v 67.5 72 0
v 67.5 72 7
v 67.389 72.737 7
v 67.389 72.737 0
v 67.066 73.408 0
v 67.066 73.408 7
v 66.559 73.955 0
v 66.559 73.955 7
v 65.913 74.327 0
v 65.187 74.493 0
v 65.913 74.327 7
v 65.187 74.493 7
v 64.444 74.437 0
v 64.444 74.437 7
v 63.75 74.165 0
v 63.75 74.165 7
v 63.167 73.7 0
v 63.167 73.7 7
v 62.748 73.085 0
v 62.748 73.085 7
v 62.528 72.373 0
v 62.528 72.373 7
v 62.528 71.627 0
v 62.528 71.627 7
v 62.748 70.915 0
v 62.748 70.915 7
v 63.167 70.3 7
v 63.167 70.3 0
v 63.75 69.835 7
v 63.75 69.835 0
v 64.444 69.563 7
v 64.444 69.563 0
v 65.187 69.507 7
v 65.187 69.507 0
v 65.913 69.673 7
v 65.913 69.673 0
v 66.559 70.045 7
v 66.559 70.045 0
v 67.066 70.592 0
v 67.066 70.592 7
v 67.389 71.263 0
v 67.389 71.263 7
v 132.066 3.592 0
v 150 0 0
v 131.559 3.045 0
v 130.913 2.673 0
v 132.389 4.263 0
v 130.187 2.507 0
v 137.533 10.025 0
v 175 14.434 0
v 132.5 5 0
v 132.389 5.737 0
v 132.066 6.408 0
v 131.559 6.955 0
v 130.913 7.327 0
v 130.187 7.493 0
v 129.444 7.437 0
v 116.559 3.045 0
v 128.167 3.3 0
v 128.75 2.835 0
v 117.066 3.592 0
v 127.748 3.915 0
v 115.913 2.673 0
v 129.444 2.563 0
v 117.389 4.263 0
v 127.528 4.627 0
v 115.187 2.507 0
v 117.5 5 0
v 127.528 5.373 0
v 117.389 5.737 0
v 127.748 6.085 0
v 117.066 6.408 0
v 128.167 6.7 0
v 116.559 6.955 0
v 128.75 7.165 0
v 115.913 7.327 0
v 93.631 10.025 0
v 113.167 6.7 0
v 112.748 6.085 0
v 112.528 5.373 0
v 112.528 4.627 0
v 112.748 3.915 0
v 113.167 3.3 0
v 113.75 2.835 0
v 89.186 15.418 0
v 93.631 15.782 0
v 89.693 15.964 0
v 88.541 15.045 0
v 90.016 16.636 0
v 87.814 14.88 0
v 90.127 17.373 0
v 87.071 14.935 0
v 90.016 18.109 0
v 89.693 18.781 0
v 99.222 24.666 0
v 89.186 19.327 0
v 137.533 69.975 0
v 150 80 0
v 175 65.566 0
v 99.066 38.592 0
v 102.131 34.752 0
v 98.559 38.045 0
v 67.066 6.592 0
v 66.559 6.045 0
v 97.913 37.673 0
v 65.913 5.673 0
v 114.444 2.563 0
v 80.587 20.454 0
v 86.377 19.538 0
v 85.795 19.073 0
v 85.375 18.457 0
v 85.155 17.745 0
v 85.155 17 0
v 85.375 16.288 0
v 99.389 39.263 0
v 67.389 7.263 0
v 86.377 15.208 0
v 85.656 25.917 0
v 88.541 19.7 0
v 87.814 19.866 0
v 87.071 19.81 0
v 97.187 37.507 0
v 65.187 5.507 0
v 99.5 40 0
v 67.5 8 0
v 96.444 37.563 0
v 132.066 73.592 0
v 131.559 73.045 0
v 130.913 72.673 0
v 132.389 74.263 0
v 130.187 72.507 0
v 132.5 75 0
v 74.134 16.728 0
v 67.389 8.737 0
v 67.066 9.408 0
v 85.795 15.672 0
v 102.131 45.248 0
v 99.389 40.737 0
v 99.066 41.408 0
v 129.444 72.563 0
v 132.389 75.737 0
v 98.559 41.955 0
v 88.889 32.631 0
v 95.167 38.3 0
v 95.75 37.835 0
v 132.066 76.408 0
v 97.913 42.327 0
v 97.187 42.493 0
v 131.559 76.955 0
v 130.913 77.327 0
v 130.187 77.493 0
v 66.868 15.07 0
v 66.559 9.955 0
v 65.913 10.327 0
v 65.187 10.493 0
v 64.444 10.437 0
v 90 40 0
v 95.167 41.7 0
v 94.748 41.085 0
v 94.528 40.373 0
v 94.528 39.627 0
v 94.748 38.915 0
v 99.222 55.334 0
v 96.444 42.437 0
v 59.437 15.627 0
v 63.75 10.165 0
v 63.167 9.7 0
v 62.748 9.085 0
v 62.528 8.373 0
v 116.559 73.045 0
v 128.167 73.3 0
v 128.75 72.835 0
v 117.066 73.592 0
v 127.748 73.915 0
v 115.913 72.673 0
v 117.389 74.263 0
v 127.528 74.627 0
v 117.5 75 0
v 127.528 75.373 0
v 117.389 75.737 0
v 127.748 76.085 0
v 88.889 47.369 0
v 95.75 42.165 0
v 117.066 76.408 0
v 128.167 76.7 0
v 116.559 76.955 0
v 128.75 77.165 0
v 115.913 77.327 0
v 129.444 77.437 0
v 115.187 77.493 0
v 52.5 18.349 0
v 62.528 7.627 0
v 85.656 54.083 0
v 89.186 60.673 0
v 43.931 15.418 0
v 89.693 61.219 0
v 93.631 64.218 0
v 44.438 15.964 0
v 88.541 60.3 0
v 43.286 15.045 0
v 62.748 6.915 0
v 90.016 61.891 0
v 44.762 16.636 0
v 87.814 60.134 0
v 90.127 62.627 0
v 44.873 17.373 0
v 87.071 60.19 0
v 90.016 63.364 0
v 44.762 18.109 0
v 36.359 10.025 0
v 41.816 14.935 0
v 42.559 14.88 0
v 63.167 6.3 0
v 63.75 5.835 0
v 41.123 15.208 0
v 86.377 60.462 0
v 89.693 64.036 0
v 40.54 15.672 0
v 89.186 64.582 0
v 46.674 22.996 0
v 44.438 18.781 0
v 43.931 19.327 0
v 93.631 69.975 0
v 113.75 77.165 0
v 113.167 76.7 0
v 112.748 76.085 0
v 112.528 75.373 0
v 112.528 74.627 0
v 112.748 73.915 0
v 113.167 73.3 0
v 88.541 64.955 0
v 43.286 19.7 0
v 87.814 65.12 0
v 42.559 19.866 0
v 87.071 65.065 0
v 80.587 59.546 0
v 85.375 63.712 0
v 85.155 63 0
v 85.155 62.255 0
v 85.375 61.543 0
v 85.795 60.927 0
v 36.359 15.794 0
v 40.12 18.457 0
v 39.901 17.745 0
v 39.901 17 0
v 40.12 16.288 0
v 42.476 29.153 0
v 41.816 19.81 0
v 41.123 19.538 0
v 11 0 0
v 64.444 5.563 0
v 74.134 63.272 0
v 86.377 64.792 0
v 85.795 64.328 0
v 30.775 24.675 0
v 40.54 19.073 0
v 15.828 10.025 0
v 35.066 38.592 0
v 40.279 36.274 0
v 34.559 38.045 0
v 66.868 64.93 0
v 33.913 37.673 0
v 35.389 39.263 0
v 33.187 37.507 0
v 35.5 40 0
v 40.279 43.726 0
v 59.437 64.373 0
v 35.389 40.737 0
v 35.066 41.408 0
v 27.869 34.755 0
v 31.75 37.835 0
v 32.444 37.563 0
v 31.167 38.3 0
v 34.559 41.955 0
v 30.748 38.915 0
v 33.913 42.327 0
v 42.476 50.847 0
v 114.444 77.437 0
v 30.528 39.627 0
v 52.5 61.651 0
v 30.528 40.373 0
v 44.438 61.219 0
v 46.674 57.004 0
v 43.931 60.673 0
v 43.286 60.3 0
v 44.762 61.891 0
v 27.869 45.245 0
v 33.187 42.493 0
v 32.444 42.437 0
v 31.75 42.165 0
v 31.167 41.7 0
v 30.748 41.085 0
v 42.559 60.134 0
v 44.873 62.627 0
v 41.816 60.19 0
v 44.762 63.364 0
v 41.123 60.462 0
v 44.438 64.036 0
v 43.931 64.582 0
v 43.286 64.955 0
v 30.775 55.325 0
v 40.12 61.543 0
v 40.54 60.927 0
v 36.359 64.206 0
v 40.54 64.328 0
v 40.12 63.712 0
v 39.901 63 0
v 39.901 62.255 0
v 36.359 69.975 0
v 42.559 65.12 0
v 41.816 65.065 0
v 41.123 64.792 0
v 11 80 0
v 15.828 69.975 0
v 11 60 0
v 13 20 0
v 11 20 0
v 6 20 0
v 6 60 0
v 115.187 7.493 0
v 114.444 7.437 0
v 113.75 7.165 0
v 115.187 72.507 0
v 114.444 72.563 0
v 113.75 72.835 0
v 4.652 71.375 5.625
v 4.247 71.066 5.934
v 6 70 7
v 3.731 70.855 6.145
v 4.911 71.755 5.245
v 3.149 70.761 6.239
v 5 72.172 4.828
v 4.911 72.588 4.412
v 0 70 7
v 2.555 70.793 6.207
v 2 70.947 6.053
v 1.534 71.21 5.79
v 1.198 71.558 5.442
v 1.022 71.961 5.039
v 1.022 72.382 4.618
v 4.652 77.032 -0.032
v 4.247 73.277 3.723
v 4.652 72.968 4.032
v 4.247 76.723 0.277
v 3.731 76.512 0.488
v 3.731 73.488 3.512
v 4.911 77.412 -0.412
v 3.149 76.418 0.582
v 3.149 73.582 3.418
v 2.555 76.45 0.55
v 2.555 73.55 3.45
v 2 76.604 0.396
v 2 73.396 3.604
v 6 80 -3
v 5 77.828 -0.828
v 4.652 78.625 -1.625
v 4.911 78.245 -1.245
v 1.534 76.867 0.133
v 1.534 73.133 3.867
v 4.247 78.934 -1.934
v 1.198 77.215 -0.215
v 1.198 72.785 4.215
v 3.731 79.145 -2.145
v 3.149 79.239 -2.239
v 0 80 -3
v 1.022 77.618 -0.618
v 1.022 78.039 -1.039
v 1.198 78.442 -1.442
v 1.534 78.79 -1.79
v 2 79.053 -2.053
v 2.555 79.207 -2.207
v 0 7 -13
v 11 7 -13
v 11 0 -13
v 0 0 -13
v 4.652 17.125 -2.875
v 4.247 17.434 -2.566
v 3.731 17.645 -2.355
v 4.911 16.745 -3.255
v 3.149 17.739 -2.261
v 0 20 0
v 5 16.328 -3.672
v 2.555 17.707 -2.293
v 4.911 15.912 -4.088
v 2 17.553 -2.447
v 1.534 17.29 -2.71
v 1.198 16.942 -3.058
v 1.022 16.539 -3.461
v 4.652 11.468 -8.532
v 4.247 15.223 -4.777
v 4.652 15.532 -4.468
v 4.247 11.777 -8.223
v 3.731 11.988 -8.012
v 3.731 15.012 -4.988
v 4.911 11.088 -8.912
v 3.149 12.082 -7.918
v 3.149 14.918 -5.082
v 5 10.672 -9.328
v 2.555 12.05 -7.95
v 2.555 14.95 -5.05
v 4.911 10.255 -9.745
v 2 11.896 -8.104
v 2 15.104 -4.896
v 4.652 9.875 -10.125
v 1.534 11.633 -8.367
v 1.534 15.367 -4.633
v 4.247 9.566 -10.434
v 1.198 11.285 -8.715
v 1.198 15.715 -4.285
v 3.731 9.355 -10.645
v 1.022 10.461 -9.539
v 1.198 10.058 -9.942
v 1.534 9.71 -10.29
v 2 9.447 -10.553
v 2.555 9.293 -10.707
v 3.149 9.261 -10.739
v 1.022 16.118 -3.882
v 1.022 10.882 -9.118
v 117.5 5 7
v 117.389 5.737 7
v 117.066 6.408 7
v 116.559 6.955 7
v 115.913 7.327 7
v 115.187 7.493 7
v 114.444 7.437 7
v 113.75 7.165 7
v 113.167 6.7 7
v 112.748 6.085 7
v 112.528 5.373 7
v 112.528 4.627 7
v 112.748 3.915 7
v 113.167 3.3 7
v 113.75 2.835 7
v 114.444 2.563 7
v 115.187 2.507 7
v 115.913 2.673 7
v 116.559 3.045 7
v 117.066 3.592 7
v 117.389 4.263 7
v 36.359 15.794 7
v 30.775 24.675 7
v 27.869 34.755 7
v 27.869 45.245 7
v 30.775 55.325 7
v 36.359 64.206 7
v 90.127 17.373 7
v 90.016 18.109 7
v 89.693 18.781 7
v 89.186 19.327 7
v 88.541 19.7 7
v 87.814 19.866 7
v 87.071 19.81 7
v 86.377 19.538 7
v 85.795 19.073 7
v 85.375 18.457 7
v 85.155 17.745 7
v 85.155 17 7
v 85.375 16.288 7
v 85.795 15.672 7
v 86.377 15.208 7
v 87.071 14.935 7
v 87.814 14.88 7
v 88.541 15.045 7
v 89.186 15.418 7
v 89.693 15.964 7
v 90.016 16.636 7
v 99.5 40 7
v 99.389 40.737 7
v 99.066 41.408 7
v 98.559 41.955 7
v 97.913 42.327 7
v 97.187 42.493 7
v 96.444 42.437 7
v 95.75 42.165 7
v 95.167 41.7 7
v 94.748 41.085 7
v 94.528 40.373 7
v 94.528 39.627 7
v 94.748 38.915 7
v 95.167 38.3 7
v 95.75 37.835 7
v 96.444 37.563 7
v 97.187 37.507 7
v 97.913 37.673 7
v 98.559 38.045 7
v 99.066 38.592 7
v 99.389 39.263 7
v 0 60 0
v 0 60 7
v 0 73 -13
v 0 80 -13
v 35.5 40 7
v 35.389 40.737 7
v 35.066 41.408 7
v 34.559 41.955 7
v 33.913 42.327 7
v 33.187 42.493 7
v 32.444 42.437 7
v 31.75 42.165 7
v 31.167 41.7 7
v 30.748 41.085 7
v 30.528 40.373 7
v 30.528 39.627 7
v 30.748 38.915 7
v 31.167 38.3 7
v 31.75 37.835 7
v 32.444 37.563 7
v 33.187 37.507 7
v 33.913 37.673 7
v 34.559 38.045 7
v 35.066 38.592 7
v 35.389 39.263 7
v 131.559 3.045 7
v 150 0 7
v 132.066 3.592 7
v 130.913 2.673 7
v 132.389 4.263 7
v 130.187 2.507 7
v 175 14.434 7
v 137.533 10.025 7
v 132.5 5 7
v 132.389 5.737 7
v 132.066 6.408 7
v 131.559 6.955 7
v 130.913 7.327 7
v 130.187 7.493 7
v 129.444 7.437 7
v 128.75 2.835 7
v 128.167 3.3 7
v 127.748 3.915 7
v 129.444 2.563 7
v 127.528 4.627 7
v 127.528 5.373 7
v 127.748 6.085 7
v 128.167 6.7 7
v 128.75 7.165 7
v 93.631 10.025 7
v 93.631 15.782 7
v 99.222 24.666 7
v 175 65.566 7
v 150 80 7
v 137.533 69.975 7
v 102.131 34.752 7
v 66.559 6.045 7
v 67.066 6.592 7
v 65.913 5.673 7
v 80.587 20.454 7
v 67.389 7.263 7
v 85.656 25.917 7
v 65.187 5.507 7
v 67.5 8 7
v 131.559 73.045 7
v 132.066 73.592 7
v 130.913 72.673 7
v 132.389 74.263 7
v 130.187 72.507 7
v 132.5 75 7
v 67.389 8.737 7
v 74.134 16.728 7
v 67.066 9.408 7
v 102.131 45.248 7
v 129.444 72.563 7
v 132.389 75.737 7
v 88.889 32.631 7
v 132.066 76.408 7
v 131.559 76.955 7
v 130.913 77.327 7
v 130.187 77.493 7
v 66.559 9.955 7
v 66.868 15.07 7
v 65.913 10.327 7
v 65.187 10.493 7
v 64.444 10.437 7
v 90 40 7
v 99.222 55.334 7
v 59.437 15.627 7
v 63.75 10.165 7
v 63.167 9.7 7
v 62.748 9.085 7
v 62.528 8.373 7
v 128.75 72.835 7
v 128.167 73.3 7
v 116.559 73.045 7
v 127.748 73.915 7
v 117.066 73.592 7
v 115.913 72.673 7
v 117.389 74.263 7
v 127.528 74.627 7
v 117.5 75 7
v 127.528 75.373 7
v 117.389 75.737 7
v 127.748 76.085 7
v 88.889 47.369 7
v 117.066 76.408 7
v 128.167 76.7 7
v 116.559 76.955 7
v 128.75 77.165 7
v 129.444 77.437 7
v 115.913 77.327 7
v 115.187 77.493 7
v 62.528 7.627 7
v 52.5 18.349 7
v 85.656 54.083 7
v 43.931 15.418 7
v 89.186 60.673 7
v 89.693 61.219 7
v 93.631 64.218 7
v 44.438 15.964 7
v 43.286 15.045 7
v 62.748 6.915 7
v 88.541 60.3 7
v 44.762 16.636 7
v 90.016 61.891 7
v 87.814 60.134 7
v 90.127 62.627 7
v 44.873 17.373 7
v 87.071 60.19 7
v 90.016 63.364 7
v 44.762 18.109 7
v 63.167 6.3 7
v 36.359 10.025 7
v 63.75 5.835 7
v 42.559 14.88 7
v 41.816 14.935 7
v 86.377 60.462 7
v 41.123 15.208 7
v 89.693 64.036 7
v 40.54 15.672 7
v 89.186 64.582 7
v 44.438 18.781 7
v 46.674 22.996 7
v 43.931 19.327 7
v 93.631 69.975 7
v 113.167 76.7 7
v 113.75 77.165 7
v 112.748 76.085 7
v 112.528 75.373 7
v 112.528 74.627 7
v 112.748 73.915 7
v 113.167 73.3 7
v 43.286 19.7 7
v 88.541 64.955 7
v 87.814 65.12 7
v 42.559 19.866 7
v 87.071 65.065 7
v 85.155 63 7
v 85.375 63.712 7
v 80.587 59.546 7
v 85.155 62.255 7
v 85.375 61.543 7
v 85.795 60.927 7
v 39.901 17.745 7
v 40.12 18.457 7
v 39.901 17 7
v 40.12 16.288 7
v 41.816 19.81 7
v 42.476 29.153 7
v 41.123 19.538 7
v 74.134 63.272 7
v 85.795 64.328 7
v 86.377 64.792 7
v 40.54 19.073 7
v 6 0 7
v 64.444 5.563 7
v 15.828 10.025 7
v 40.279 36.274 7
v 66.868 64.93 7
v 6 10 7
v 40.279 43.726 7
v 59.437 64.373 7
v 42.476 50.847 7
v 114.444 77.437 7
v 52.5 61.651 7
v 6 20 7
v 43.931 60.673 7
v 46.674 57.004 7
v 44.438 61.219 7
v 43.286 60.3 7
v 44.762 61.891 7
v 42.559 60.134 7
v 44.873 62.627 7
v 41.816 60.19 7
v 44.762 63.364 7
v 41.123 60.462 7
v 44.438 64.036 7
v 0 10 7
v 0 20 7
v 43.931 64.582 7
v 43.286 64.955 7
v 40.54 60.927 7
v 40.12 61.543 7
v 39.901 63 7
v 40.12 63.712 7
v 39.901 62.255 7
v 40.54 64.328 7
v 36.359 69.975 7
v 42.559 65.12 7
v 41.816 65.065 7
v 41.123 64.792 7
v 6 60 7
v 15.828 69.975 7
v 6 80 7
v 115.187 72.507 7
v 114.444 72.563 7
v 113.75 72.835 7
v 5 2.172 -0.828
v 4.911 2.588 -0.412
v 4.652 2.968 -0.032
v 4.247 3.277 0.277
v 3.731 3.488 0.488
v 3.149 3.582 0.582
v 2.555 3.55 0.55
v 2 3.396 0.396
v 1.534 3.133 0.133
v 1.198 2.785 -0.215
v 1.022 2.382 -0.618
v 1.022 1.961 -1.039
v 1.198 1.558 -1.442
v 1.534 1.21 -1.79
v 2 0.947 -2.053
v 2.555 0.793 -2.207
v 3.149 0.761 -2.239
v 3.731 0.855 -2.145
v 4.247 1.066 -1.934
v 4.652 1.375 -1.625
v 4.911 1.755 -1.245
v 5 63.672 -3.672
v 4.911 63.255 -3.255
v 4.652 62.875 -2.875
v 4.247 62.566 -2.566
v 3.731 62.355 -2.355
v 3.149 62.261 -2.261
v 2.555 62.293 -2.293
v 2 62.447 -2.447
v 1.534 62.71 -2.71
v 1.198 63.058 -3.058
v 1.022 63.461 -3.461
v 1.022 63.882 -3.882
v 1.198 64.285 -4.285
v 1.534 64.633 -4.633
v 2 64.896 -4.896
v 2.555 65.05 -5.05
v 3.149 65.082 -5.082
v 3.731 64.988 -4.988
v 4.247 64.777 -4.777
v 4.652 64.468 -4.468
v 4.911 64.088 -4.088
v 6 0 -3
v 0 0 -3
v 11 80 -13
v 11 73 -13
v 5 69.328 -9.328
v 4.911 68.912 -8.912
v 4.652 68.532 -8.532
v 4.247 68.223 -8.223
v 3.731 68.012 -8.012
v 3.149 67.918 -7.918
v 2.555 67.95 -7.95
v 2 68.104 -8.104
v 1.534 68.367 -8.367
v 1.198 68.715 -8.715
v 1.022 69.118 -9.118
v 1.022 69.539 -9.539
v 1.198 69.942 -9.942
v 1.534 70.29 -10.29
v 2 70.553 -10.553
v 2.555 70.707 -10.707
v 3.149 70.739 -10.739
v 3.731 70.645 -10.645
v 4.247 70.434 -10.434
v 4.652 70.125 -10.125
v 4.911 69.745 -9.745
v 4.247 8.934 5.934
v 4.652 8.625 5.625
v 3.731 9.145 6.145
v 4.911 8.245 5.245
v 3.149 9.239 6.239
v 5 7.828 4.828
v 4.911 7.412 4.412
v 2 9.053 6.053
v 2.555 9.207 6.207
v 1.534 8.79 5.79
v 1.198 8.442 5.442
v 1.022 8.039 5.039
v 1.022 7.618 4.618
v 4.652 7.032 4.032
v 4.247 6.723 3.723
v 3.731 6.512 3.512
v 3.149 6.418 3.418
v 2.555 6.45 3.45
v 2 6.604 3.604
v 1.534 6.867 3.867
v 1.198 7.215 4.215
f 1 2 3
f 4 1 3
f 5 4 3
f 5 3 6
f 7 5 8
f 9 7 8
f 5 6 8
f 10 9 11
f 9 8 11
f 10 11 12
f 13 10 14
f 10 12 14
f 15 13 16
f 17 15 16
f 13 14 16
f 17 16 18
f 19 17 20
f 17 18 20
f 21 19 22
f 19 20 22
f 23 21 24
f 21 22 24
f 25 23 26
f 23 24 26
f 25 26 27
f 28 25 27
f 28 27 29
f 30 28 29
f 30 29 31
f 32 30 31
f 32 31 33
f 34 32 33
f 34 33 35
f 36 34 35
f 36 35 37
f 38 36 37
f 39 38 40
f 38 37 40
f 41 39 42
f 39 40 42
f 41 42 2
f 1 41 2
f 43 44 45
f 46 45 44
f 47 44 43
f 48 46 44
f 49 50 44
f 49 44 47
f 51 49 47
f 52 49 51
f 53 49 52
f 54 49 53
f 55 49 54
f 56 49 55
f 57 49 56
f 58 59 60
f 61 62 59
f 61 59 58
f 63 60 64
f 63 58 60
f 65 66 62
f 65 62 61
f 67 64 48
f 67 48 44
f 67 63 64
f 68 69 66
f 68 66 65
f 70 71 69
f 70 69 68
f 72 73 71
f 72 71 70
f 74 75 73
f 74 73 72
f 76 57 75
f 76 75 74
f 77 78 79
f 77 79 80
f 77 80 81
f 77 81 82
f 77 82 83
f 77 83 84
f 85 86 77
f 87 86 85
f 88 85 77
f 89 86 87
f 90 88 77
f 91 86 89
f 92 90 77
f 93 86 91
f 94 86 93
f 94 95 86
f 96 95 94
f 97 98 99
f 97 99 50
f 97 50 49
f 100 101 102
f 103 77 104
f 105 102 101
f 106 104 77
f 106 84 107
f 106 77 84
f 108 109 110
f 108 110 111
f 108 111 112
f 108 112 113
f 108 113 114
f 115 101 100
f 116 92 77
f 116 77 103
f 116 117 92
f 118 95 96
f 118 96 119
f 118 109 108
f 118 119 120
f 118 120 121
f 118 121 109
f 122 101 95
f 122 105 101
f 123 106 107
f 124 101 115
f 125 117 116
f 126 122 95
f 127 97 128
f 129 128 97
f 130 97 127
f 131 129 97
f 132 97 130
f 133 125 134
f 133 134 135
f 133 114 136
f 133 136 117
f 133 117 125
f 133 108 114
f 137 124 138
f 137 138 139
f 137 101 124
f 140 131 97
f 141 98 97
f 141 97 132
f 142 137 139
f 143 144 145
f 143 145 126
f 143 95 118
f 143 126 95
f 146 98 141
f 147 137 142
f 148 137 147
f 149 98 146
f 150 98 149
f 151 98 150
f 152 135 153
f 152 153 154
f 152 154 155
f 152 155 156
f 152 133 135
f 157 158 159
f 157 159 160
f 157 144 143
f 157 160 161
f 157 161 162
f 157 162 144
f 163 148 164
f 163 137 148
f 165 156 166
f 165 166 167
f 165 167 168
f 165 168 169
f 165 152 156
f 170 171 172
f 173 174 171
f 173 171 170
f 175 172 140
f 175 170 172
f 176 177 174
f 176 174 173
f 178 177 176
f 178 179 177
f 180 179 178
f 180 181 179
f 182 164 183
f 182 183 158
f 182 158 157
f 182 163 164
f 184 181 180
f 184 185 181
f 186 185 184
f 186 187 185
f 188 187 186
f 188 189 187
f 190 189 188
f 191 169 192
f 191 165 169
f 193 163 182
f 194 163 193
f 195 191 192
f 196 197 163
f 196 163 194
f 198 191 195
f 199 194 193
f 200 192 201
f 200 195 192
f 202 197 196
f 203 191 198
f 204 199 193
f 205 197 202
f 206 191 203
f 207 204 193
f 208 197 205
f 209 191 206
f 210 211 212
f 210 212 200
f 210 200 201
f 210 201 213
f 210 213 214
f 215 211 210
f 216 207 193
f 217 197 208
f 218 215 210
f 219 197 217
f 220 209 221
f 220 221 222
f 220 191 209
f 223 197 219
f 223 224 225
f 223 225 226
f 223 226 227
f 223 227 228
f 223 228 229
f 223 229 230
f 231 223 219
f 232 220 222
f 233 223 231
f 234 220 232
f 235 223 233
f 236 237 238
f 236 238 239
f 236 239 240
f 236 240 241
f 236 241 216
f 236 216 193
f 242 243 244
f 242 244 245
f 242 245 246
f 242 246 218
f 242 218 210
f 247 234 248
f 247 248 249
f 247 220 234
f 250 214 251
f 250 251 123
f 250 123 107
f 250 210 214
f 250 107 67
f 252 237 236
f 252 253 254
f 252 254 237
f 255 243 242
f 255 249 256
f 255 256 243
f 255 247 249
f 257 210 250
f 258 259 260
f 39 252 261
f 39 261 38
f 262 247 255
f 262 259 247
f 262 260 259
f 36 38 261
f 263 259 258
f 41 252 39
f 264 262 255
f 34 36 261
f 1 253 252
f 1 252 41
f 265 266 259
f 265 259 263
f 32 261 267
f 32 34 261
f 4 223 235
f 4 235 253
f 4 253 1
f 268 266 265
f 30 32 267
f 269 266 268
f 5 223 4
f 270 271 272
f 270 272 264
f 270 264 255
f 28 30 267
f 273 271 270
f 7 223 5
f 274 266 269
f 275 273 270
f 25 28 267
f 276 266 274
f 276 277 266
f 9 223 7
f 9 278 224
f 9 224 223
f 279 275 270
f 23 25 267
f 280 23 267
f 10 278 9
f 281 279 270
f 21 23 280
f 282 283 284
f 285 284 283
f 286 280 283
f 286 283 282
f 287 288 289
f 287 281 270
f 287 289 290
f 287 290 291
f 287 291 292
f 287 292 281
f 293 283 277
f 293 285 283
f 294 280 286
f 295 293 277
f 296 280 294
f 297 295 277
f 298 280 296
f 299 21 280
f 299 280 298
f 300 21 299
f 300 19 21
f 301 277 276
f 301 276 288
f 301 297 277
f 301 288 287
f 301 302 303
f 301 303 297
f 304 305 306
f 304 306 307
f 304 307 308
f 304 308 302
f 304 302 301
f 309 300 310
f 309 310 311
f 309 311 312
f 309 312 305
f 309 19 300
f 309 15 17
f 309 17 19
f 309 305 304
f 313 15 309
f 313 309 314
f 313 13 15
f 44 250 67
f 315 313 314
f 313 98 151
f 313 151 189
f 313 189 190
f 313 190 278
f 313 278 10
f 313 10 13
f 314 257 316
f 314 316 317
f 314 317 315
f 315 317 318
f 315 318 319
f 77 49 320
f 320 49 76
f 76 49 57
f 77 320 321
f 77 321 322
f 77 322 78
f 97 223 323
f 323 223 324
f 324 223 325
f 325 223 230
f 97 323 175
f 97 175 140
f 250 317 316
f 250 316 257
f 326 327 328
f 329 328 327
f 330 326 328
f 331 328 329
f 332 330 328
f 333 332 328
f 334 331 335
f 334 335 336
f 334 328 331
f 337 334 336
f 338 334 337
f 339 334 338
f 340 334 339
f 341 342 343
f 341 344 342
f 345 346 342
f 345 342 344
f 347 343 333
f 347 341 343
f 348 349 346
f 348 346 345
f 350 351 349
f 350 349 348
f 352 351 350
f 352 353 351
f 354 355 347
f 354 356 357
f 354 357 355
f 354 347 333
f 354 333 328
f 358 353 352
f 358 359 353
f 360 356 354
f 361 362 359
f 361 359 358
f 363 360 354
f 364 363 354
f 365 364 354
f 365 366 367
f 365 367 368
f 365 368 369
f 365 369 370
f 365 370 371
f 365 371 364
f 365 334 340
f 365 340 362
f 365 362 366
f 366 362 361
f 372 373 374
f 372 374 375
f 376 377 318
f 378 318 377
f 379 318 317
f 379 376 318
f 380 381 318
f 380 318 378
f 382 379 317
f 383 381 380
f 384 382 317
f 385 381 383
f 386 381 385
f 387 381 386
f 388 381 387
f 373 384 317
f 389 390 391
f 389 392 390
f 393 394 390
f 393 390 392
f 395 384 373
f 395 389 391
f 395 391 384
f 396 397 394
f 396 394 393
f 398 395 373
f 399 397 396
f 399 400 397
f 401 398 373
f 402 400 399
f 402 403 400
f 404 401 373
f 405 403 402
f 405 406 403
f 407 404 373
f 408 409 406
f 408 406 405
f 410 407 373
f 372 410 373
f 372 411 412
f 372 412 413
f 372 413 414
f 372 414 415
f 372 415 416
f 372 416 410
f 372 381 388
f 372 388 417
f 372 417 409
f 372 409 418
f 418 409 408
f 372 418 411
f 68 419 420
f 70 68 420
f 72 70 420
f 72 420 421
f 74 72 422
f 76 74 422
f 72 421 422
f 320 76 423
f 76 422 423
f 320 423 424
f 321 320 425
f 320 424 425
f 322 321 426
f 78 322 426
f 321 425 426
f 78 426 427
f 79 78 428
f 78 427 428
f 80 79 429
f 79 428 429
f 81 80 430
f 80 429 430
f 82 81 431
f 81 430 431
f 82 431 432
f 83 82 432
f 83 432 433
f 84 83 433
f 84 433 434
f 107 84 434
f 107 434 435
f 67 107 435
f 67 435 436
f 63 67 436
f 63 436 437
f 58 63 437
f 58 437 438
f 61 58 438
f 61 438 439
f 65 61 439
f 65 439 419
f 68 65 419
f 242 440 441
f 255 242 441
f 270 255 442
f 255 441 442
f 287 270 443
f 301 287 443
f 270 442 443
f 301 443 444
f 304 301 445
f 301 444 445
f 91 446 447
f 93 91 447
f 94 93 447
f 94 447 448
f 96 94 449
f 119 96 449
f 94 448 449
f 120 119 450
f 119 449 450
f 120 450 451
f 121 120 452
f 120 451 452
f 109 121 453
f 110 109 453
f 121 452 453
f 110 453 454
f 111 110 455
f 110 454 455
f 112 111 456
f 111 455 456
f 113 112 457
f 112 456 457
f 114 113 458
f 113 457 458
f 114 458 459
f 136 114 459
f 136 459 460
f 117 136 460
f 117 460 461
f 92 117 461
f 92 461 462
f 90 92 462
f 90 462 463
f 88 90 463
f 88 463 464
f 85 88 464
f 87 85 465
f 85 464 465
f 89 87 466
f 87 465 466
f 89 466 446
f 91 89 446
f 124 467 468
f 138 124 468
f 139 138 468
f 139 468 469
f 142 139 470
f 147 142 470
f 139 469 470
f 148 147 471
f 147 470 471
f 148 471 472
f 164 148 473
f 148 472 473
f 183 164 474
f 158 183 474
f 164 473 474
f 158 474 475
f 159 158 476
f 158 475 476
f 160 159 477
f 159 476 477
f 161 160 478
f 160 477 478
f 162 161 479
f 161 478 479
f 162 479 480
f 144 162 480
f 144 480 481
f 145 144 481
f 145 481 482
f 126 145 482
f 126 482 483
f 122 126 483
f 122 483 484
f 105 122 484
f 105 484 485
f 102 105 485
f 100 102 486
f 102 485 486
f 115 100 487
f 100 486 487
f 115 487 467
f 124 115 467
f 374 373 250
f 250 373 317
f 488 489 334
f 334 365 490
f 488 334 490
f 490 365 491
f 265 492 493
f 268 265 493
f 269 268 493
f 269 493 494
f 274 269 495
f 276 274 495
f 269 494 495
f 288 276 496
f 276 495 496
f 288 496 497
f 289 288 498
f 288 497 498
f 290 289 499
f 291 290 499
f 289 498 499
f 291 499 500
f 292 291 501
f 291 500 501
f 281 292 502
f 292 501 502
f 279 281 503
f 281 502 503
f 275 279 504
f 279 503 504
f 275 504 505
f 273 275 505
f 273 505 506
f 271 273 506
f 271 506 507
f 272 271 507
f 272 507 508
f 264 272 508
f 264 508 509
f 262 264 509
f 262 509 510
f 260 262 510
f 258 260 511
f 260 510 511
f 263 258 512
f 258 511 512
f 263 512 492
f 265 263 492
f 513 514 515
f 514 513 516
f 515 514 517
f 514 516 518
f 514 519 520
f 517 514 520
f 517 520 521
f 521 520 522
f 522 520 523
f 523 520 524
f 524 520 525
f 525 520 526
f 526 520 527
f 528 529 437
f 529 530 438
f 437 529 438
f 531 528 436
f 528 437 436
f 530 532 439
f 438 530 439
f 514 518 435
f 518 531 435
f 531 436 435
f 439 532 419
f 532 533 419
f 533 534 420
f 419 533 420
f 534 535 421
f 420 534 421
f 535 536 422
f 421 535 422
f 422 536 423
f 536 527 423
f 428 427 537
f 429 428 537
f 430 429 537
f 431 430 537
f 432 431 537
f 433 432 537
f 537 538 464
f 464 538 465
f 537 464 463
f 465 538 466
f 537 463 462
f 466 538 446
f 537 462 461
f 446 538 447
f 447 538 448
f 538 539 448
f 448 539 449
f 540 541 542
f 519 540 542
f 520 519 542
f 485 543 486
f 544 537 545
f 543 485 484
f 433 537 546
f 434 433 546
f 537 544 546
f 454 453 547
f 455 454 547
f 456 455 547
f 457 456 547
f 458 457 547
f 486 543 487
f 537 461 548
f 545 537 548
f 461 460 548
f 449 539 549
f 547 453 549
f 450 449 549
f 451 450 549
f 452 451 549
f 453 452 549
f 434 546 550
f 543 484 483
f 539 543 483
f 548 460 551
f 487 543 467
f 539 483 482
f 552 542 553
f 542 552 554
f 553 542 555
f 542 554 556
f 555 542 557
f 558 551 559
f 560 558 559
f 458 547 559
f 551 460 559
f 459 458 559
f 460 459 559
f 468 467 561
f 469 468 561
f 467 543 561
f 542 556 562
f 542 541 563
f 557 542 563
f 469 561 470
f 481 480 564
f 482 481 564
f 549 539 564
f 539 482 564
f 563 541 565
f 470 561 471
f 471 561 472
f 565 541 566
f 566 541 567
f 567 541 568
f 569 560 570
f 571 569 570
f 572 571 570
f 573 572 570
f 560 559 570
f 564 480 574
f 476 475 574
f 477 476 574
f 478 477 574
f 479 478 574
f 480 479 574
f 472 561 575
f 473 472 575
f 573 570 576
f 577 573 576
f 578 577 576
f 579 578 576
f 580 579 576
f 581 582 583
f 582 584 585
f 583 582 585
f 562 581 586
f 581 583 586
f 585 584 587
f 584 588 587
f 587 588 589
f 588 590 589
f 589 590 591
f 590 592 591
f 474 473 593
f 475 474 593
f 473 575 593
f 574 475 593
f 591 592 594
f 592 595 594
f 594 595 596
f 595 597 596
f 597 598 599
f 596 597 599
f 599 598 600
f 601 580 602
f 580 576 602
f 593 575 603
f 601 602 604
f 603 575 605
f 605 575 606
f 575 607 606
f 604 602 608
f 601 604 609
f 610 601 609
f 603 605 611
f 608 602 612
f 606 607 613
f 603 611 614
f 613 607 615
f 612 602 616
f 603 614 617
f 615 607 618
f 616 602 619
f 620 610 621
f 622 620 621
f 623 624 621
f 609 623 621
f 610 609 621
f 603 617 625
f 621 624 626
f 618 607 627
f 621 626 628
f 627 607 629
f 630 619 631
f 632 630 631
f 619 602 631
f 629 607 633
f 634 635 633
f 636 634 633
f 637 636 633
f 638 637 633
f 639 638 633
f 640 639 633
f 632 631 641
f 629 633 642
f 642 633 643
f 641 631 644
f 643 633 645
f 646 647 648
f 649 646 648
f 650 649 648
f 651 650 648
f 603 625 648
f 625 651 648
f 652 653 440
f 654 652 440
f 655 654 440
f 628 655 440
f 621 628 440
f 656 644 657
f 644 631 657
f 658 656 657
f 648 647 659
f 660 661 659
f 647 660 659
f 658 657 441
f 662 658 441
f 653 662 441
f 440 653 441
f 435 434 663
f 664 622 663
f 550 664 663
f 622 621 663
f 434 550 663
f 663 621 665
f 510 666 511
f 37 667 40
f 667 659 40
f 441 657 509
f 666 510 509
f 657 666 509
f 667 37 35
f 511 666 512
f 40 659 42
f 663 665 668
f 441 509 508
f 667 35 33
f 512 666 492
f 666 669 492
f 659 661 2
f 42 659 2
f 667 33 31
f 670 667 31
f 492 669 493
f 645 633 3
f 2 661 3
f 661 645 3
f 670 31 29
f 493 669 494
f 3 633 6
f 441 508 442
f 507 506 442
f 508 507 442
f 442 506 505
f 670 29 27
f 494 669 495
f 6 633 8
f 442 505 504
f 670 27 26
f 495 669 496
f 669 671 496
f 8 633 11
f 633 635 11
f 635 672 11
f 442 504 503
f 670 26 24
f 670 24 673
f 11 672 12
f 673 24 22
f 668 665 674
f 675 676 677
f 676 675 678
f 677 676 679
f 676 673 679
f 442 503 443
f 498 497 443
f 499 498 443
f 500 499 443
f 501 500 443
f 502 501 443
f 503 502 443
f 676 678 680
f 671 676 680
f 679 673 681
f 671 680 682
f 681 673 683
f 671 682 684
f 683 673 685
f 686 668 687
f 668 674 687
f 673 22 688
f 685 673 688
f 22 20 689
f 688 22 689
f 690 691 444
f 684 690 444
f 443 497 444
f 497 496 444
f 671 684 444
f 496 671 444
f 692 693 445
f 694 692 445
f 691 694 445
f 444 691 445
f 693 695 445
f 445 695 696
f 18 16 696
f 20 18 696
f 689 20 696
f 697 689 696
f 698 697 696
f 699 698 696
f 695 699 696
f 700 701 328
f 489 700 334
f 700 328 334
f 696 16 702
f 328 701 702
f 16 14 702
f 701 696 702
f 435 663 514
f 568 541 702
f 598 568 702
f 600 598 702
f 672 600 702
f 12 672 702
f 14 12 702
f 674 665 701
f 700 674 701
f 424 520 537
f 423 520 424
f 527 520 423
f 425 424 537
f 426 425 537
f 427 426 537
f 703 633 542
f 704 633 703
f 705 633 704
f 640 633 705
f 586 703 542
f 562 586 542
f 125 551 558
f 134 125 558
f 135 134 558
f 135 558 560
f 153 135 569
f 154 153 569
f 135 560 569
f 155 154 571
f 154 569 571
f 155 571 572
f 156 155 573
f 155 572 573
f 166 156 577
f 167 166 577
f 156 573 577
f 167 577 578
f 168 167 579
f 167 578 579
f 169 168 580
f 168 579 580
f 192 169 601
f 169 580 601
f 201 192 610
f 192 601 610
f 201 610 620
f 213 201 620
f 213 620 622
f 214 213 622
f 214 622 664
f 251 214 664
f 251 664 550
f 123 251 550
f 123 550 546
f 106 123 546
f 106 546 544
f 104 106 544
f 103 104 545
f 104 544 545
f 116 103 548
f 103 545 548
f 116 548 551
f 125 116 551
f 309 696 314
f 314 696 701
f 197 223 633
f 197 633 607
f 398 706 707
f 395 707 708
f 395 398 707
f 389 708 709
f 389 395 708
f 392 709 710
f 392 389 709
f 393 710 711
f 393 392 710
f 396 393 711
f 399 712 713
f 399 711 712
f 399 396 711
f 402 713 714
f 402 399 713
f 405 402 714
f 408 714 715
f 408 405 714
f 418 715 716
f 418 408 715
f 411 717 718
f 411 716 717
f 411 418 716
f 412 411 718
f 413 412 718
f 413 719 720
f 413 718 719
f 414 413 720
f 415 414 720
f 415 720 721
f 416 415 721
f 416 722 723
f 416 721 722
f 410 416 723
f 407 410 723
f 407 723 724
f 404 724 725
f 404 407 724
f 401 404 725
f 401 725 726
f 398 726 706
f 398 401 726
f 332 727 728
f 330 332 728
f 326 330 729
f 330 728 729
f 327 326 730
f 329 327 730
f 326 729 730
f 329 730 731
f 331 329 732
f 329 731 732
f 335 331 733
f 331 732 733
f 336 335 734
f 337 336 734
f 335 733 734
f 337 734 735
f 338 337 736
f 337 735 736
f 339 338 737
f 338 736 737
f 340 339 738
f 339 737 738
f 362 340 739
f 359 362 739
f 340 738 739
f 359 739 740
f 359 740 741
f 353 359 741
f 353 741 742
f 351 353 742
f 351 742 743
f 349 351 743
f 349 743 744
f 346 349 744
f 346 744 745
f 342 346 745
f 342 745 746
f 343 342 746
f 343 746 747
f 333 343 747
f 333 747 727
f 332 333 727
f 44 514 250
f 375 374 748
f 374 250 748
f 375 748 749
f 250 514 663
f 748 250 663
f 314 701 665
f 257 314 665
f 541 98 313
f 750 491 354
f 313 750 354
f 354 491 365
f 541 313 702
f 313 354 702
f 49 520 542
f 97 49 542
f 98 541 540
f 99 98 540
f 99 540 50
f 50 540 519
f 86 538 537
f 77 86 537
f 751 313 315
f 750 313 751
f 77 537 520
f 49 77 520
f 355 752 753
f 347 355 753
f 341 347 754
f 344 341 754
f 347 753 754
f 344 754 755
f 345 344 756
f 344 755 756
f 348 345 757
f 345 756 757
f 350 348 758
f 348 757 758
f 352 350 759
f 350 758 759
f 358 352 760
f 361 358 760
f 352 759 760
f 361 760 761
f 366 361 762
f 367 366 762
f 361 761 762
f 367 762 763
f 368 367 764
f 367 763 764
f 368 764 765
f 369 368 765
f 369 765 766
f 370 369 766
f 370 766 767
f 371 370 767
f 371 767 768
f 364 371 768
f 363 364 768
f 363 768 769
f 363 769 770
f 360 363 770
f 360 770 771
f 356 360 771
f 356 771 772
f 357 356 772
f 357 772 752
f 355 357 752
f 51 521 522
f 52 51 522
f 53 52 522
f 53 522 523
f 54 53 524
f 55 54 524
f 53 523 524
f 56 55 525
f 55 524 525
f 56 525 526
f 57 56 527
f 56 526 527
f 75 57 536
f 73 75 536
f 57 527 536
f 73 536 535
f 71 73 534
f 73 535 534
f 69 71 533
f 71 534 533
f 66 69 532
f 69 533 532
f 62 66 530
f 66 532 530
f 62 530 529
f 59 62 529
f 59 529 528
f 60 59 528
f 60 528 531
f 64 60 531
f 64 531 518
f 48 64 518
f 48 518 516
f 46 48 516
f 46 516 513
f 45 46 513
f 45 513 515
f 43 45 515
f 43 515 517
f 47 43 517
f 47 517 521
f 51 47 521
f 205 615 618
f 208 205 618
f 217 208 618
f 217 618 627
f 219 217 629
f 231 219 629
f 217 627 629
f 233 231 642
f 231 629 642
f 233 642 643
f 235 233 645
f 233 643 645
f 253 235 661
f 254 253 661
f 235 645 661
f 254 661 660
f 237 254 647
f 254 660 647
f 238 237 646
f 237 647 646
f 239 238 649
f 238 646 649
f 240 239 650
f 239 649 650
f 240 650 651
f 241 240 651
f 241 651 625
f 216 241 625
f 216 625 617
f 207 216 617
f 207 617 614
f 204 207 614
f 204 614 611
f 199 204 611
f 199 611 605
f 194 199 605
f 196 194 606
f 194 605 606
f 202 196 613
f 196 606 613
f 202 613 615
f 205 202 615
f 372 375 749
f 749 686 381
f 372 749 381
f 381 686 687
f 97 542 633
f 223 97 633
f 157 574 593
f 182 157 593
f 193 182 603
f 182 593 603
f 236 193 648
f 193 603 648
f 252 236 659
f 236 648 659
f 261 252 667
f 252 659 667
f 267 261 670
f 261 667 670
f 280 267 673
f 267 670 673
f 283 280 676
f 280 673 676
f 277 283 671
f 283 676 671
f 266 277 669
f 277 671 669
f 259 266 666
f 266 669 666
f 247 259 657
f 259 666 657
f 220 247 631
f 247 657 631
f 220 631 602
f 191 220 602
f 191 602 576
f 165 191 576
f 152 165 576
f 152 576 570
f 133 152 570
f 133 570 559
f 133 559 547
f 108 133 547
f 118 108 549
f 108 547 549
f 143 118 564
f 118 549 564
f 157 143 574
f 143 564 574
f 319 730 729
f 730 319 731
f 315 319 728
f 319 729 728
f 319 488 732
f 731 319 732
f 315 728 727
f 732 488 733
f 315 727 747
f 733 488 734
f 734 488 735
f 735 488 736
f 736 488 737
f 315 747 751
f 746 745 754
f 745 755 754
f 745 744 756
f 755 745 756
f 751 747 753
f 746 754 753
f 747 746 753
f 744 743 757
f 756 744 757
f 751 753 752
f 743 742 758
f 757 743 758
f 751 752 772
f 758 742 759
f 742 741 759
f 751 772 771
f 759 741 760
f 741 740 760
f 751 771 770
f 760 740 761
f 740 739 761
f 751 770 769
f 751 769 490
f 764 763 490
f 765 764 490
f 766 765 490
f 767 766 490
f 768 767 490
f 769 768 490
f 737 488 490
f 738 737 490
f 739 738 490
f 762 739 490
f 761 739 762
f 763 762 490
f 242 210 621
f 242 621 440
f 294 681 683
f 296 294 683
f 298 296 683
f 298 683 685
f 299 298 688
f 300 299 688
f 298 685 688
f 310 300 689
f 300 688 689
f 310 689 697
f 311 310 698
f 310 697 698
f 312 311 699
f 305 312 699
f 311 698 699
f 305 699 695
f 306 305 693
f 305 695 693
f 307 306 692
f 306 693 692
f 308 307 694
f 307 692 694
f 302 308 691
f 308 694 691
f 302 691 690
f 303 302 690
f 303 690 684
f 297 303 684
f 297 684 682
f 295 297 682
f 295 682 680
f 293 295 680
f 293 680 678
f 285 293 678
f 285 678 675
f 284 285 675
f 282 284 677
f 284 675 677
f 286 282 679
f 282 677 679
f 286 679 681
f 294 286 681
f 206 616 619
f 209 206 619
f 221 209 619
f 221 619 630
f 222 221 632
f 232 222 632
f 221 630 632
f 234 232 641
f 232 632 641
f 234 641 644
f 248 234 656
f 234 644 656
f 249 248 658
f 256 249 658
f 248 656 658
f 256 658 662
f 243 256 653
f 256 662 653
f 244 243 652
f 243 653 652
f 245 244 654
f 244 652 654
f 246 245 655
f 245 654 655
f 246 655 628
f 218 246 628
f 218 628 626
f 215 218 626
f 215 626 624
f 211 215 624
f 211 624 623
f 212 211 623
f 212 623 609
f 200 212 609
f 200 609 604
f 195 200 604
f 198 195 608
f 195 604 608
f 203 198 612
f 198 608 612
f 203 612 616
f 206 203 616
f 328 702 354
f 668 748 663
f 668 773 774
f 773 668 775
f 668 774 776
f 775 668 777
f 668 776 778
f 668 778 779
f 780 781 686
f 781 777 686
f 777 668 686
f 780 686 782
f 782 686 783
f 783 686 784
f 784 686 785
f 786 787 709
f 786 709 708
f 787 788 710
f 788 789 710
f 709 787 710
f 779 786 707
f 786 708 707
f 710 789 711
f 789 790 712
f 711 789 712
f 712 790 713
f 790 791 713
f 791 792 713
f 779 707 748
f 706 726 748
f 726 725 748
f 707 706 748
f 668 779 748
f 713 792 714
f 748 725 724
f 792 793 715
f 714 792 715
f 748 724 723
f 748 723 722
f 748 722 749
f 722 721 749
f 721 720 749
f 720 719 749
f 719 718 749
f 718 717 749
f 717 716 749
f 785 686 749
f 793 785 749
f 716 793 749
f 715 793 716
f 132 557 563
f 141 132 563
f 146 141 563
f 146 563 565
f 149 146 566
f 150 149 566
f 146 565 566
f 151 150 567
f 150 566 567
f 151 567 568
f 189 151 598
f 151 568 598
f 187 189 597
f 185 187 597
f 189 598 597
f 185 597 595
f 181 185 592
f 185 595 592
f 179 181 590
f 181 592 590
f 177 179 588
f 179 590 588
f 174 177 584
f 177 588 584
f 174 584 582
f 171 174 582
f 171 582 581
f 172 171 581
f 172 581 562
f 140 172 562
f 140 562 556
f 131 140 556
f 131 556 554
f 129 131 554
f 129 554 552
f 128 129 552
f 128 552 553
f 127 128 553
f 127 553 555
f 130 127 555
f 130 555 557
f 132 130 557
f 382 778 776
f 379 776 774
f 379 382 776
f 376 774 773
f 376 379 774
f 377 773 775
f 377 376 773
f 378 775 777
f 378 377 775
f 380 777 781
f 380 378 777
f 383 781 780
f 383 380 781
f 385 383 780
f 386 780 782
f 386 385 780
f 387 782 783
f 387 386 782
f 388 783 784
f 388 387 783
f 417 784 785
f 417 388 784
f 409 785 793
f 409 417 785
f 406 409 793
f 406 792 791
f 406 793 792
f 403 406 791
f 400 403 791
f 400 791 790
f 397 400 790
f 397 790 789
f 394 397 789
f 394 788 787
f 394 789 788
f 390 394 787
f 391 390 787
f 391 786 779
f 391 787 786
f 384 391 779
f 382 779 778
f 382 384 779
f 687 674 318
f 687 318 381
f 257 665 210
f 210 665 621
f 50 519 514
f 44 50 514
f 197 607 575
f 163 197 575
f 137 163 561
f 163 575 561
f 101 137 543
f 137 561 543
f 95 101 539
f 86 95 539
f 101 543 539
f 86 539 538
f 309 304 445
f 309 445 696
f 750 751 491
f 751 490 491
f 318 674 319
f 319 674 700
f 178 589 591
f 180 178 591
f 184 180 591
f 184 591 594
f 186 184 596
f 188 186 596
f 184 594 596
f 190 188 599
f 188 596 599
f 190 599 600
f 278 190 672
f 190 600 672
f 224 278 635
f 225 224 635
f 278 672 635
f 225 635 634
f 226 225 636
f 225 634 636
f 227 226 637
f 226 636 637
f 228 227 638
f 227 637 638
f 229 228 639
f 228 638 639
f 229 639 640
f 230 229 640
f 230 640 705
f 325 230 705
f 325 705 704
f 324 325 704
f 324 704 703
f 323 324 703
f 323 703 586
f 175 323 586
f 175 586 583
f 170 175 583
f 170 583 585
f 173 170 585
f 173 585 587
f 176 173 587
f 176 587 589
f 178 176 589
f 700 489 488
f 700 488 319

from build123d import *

# Parameters (mm, degrees)
SKETCH1_W           = 150
SKETCH1_H           = 80
BOSS_EXTRUDE1_DEPTH = 7
SKETCH2_W           = 6
SKETCH2_H           = 40
CUT_EXTRUDE2_DEPTH  = 7
SKETCH3_R           = 25
CUT_EXTRUDE3_DEPTH  = 7
CUT_EXTRUDE5_DEPTH  = 7
CUT_EXTRUDE6_DEPTH  = 7
SKETCH6_R           = 2.5
CUT_EXTRUDE7_DEPTH  = 7
BOSS_EXTRUDE2_DEPTH = 6
CUT_EXTRUDE8_DEPTH  = 6
SKETCH10_W          = 6
SKETCH10_H          = 20
BOSS_EXTRUDE3_DEPTH = 13
CUT_EXTRUDE9_DEPTH  = 13
SKETCH12_R          = 2.5
CUT_EXTRUDE10_DEPTH = 13
BOSS_EXTRUDE5_DEPTH = 5
SKETCH14_R          = 2
CUT_EXTRUDE11_DEPTH = 20.091883092
CUT_EXTRUDE13_DEPTH = 6
BOSS_EXTRUDE6_DEPTH = 7


with BuildPart() as part:
    # Sketch1 → Boss-Extrude1 (new body)
    with BuildSketch(Plane.XY):
        with Locations((75, 40)):
            Rectangle(SKETCH1_W, SKETCH1_H)
    extrude(amount=BOSS_EXTRUDE1_DEPTH)

    # Sketch2 → Cut-Extrude2 (cut)
    with BuildSketch(Plane.XY.offset(7)):
        with Locations((3, 40)):
            Rectangle(SKETCH2_W, SKETCH2_H)
    extrude(amount=-CUT_EXTRUDE2_DEPTH, mode=Mode.SUBTRACT)

    # Sketch3 → Cut-Extrude3 (cut)
    with BuildSketch(Plane.XY.offset(7)):
        with Locations((65, 40)):
            Circle(SKETCH3_R)
    extrude(amount=-CUT_EXTRUDE3_DEPTH, mode=Mode.SUBTRACT)

    # Sketch4 → Cut-Extrude5 (cut)
    with BuildSketch(Plane.XY.offset(7)):
        with BuildLine():
            Line((15.828446624, 69.975175599), (15.828446624, 10.024824401))
            Line((15.828446624, 10.024824401), (36.358795003, 10.024824401))
            Line((36.358795003, 10.024824401), (36.358795003, 15.793980576))
            ThreePointArc((36.358795003, 15.793980576), (27.5, 40), (36.358795003, 64.206019424))
            Line((36.358795003, 64.206019424), (36.358795003, 69.975175599))
            Line((36.358795003, 69.975175599), (15.828446624, 69.975175599))
        make_face()
    extrude(amount=-CUT_EXTRUDE5_DEPTH, mode=Mode.SUBTRACT)

    # Sketch5 → Cut-Extrude6 (cut)
    with BuildSketch(Plane.XY.offset(7)):
        with BuildLine():
            Line((93.631196157, 69.975175599), (93.631196157, 64.217857185))
            ThreePointArc((93.631196157, 64.217857185), (102.5, 40), (93.631196157, 15.782142815))
            Line((93.631196157, 15.782142815), (93.631196157, 10.024824401))
            Line((93.631196157, 10.024824401), (137.533061217, 10.024824401))
            Line((137.533061217, 10.024824401), (137.533061217, 69.975175599))
            Line((137.533061217, 69.975175599), (93.631196157, 69.975175599))
        make_face()
    extrude(amount=-CUT_EXTRUDE6_DEPTH, mode=Mode.SUBTRACT)

    # Sketch6 → Cut-Extrude7 (cut)
    with BuildSketch(Plane.XY.offset(7)):
        with Locations((97, 40)):
            Circle(SKETCH6_R)
        with Locations((87.627416998, 17.372583002)):
            Circle(SKETCH6_R)
        with Locations((65, 8)):
            Circle(SKETCH6_R)
        with Locations((42.372583002, 17.372583002)):
            Circle(SKETCH6_R)
        with Locations((33, 40)):
            Circle(SKETCH6_R)
        with Locations((42.372583002, 62.627416998)):
            Circle(SKETCH6_R)
        with Locations((65, 72)):
            Circle(SKETCH6_R)
        with Locations((87.627416998, 62.627416998)):
            Circle(SKETCH6_R)
    extrude(amount=-CUT_EXTRUDE7_DEPTH, mode=Mode.SUBTRACT)

    # Sketch8 → Boss-Extrude2 (add)
    with BuildSketch(Plane.ZY):
        Polygon((0, 60), (-20, 80), (0, 80), align=None)
    extrude(amount=-BOSS_EXTRUDE2_DEPTH)

    # Sketch9 → Cut-Extrude8 (cut)
    with BuildSketch(Plane.ZY):
        Polygon((-13, 80), (-13, 73), (-20, 80), align=None)
    extrude(amount=-CUT_EXTRUDE8_DEPTH, mode=Mode.SUBTRACT)

    # Sketch10 → Boss-Extrude3 (add)
    with BuildSketch(Plane(origin=(0, 0, 0), x_dir=(-1, 0, 0), z_dir=(0, 0, -1))):
        with Locations((-3, 10)):
            Rectangle(SKETCH10_W, SKETCH10_H)
    extrude(amount=BOSS_EXTRUDE3_DEPTH)

    # Sketch11 → Cut-Extrude9 (cut)
    with BuildSketch(Plane.ZY):
        Polygon((0, 20), (-13, 7), (-13, 20), align=None)
    extrude(amount=-CUT_EXTRUDE9_DEPTH, mode=Mode.SUBTRACT)

    # Sketch12 → Cut-Extrude10 (cut)
    with BuildSketch(Plane.XY.offset(7)):
        with Locations((130, 75)):
            Circle(SKETCH12_R)
        with Locations((115, 75)):
            Circle(SKETCH12_R)
        with Locations((130, 5)):
            Circle(SKETCH12_R)
        with Locations((115, 5)):
            Circle(SKETCH12_R)
    extrude(amount=-CUT_EXTRUDE10_DEPTH, mode=Mode.SUBTRACT)

    # Sketch13 → Boss-Extrude5 (add)
    with BuildSketch(Plane(origin=(6, 0, 0), x_dir=(0, 0, -1), z_dir=(1, 0, 0))):
        Polygon((0, 60), (13, 73), (13, 80), (0, 80), align=None)
        Polygon((13, 0), (0, 0), (0, 20), (13, 7), align=None)
    extrude(amount=BOSS_EXTRUDE5_DEPTH)

    # Sketch14 → Cut-Extrude11 (cut, through all)
    with BuildSketch(Plane(origin=(0, 30, 30), x_dir=(1, 0, 0), z_dir=(0, -0.707106781, -0.707106781))):
        with Locations((3, -47.618795027)):
            Circle(SKETCH14_R)
        with Locations((3, -55.618795027)):
            Circle(SKETCH14_R)
    cut_extrude11 = extrude(amount=-CUT_EXTRUDE11_DEPTH, mode=Mode.SUBTRACT)

    # Sketch15 → Cut-Extrude13 (cut)
    with BuildSketch(Plane.ZY):
        Polygon((7, 70), (-3, 80), (7, 80), align=None)
        Polygon((-3, 0), (7, 0), (7, 10), align=None)
    extrude(amount=-CUT_EXTRUDE13_DEPTH, mode=Mode.SUBTRACT)

    # Mirror1: Cut-Extrude11 across plane
    add(cut_extrude11.mirror(Plane(origin=(0, 40, 0), x_dir=(0, 0, 1), z_dir=(0, -1, 0))), mode=Mode.SUBTRACT)

    # Sketch17 → Boss-Extrude6 (add)
    with BuildSketch(Plane.XY.offset(7)):
        Polygon((150, 80), (175, 65.56624327), (175, 14.43375673), (150, 0), align=None)
    extrude(amount=-BOSS_EXTRUDE6_DEPTH)


solid = part.part
